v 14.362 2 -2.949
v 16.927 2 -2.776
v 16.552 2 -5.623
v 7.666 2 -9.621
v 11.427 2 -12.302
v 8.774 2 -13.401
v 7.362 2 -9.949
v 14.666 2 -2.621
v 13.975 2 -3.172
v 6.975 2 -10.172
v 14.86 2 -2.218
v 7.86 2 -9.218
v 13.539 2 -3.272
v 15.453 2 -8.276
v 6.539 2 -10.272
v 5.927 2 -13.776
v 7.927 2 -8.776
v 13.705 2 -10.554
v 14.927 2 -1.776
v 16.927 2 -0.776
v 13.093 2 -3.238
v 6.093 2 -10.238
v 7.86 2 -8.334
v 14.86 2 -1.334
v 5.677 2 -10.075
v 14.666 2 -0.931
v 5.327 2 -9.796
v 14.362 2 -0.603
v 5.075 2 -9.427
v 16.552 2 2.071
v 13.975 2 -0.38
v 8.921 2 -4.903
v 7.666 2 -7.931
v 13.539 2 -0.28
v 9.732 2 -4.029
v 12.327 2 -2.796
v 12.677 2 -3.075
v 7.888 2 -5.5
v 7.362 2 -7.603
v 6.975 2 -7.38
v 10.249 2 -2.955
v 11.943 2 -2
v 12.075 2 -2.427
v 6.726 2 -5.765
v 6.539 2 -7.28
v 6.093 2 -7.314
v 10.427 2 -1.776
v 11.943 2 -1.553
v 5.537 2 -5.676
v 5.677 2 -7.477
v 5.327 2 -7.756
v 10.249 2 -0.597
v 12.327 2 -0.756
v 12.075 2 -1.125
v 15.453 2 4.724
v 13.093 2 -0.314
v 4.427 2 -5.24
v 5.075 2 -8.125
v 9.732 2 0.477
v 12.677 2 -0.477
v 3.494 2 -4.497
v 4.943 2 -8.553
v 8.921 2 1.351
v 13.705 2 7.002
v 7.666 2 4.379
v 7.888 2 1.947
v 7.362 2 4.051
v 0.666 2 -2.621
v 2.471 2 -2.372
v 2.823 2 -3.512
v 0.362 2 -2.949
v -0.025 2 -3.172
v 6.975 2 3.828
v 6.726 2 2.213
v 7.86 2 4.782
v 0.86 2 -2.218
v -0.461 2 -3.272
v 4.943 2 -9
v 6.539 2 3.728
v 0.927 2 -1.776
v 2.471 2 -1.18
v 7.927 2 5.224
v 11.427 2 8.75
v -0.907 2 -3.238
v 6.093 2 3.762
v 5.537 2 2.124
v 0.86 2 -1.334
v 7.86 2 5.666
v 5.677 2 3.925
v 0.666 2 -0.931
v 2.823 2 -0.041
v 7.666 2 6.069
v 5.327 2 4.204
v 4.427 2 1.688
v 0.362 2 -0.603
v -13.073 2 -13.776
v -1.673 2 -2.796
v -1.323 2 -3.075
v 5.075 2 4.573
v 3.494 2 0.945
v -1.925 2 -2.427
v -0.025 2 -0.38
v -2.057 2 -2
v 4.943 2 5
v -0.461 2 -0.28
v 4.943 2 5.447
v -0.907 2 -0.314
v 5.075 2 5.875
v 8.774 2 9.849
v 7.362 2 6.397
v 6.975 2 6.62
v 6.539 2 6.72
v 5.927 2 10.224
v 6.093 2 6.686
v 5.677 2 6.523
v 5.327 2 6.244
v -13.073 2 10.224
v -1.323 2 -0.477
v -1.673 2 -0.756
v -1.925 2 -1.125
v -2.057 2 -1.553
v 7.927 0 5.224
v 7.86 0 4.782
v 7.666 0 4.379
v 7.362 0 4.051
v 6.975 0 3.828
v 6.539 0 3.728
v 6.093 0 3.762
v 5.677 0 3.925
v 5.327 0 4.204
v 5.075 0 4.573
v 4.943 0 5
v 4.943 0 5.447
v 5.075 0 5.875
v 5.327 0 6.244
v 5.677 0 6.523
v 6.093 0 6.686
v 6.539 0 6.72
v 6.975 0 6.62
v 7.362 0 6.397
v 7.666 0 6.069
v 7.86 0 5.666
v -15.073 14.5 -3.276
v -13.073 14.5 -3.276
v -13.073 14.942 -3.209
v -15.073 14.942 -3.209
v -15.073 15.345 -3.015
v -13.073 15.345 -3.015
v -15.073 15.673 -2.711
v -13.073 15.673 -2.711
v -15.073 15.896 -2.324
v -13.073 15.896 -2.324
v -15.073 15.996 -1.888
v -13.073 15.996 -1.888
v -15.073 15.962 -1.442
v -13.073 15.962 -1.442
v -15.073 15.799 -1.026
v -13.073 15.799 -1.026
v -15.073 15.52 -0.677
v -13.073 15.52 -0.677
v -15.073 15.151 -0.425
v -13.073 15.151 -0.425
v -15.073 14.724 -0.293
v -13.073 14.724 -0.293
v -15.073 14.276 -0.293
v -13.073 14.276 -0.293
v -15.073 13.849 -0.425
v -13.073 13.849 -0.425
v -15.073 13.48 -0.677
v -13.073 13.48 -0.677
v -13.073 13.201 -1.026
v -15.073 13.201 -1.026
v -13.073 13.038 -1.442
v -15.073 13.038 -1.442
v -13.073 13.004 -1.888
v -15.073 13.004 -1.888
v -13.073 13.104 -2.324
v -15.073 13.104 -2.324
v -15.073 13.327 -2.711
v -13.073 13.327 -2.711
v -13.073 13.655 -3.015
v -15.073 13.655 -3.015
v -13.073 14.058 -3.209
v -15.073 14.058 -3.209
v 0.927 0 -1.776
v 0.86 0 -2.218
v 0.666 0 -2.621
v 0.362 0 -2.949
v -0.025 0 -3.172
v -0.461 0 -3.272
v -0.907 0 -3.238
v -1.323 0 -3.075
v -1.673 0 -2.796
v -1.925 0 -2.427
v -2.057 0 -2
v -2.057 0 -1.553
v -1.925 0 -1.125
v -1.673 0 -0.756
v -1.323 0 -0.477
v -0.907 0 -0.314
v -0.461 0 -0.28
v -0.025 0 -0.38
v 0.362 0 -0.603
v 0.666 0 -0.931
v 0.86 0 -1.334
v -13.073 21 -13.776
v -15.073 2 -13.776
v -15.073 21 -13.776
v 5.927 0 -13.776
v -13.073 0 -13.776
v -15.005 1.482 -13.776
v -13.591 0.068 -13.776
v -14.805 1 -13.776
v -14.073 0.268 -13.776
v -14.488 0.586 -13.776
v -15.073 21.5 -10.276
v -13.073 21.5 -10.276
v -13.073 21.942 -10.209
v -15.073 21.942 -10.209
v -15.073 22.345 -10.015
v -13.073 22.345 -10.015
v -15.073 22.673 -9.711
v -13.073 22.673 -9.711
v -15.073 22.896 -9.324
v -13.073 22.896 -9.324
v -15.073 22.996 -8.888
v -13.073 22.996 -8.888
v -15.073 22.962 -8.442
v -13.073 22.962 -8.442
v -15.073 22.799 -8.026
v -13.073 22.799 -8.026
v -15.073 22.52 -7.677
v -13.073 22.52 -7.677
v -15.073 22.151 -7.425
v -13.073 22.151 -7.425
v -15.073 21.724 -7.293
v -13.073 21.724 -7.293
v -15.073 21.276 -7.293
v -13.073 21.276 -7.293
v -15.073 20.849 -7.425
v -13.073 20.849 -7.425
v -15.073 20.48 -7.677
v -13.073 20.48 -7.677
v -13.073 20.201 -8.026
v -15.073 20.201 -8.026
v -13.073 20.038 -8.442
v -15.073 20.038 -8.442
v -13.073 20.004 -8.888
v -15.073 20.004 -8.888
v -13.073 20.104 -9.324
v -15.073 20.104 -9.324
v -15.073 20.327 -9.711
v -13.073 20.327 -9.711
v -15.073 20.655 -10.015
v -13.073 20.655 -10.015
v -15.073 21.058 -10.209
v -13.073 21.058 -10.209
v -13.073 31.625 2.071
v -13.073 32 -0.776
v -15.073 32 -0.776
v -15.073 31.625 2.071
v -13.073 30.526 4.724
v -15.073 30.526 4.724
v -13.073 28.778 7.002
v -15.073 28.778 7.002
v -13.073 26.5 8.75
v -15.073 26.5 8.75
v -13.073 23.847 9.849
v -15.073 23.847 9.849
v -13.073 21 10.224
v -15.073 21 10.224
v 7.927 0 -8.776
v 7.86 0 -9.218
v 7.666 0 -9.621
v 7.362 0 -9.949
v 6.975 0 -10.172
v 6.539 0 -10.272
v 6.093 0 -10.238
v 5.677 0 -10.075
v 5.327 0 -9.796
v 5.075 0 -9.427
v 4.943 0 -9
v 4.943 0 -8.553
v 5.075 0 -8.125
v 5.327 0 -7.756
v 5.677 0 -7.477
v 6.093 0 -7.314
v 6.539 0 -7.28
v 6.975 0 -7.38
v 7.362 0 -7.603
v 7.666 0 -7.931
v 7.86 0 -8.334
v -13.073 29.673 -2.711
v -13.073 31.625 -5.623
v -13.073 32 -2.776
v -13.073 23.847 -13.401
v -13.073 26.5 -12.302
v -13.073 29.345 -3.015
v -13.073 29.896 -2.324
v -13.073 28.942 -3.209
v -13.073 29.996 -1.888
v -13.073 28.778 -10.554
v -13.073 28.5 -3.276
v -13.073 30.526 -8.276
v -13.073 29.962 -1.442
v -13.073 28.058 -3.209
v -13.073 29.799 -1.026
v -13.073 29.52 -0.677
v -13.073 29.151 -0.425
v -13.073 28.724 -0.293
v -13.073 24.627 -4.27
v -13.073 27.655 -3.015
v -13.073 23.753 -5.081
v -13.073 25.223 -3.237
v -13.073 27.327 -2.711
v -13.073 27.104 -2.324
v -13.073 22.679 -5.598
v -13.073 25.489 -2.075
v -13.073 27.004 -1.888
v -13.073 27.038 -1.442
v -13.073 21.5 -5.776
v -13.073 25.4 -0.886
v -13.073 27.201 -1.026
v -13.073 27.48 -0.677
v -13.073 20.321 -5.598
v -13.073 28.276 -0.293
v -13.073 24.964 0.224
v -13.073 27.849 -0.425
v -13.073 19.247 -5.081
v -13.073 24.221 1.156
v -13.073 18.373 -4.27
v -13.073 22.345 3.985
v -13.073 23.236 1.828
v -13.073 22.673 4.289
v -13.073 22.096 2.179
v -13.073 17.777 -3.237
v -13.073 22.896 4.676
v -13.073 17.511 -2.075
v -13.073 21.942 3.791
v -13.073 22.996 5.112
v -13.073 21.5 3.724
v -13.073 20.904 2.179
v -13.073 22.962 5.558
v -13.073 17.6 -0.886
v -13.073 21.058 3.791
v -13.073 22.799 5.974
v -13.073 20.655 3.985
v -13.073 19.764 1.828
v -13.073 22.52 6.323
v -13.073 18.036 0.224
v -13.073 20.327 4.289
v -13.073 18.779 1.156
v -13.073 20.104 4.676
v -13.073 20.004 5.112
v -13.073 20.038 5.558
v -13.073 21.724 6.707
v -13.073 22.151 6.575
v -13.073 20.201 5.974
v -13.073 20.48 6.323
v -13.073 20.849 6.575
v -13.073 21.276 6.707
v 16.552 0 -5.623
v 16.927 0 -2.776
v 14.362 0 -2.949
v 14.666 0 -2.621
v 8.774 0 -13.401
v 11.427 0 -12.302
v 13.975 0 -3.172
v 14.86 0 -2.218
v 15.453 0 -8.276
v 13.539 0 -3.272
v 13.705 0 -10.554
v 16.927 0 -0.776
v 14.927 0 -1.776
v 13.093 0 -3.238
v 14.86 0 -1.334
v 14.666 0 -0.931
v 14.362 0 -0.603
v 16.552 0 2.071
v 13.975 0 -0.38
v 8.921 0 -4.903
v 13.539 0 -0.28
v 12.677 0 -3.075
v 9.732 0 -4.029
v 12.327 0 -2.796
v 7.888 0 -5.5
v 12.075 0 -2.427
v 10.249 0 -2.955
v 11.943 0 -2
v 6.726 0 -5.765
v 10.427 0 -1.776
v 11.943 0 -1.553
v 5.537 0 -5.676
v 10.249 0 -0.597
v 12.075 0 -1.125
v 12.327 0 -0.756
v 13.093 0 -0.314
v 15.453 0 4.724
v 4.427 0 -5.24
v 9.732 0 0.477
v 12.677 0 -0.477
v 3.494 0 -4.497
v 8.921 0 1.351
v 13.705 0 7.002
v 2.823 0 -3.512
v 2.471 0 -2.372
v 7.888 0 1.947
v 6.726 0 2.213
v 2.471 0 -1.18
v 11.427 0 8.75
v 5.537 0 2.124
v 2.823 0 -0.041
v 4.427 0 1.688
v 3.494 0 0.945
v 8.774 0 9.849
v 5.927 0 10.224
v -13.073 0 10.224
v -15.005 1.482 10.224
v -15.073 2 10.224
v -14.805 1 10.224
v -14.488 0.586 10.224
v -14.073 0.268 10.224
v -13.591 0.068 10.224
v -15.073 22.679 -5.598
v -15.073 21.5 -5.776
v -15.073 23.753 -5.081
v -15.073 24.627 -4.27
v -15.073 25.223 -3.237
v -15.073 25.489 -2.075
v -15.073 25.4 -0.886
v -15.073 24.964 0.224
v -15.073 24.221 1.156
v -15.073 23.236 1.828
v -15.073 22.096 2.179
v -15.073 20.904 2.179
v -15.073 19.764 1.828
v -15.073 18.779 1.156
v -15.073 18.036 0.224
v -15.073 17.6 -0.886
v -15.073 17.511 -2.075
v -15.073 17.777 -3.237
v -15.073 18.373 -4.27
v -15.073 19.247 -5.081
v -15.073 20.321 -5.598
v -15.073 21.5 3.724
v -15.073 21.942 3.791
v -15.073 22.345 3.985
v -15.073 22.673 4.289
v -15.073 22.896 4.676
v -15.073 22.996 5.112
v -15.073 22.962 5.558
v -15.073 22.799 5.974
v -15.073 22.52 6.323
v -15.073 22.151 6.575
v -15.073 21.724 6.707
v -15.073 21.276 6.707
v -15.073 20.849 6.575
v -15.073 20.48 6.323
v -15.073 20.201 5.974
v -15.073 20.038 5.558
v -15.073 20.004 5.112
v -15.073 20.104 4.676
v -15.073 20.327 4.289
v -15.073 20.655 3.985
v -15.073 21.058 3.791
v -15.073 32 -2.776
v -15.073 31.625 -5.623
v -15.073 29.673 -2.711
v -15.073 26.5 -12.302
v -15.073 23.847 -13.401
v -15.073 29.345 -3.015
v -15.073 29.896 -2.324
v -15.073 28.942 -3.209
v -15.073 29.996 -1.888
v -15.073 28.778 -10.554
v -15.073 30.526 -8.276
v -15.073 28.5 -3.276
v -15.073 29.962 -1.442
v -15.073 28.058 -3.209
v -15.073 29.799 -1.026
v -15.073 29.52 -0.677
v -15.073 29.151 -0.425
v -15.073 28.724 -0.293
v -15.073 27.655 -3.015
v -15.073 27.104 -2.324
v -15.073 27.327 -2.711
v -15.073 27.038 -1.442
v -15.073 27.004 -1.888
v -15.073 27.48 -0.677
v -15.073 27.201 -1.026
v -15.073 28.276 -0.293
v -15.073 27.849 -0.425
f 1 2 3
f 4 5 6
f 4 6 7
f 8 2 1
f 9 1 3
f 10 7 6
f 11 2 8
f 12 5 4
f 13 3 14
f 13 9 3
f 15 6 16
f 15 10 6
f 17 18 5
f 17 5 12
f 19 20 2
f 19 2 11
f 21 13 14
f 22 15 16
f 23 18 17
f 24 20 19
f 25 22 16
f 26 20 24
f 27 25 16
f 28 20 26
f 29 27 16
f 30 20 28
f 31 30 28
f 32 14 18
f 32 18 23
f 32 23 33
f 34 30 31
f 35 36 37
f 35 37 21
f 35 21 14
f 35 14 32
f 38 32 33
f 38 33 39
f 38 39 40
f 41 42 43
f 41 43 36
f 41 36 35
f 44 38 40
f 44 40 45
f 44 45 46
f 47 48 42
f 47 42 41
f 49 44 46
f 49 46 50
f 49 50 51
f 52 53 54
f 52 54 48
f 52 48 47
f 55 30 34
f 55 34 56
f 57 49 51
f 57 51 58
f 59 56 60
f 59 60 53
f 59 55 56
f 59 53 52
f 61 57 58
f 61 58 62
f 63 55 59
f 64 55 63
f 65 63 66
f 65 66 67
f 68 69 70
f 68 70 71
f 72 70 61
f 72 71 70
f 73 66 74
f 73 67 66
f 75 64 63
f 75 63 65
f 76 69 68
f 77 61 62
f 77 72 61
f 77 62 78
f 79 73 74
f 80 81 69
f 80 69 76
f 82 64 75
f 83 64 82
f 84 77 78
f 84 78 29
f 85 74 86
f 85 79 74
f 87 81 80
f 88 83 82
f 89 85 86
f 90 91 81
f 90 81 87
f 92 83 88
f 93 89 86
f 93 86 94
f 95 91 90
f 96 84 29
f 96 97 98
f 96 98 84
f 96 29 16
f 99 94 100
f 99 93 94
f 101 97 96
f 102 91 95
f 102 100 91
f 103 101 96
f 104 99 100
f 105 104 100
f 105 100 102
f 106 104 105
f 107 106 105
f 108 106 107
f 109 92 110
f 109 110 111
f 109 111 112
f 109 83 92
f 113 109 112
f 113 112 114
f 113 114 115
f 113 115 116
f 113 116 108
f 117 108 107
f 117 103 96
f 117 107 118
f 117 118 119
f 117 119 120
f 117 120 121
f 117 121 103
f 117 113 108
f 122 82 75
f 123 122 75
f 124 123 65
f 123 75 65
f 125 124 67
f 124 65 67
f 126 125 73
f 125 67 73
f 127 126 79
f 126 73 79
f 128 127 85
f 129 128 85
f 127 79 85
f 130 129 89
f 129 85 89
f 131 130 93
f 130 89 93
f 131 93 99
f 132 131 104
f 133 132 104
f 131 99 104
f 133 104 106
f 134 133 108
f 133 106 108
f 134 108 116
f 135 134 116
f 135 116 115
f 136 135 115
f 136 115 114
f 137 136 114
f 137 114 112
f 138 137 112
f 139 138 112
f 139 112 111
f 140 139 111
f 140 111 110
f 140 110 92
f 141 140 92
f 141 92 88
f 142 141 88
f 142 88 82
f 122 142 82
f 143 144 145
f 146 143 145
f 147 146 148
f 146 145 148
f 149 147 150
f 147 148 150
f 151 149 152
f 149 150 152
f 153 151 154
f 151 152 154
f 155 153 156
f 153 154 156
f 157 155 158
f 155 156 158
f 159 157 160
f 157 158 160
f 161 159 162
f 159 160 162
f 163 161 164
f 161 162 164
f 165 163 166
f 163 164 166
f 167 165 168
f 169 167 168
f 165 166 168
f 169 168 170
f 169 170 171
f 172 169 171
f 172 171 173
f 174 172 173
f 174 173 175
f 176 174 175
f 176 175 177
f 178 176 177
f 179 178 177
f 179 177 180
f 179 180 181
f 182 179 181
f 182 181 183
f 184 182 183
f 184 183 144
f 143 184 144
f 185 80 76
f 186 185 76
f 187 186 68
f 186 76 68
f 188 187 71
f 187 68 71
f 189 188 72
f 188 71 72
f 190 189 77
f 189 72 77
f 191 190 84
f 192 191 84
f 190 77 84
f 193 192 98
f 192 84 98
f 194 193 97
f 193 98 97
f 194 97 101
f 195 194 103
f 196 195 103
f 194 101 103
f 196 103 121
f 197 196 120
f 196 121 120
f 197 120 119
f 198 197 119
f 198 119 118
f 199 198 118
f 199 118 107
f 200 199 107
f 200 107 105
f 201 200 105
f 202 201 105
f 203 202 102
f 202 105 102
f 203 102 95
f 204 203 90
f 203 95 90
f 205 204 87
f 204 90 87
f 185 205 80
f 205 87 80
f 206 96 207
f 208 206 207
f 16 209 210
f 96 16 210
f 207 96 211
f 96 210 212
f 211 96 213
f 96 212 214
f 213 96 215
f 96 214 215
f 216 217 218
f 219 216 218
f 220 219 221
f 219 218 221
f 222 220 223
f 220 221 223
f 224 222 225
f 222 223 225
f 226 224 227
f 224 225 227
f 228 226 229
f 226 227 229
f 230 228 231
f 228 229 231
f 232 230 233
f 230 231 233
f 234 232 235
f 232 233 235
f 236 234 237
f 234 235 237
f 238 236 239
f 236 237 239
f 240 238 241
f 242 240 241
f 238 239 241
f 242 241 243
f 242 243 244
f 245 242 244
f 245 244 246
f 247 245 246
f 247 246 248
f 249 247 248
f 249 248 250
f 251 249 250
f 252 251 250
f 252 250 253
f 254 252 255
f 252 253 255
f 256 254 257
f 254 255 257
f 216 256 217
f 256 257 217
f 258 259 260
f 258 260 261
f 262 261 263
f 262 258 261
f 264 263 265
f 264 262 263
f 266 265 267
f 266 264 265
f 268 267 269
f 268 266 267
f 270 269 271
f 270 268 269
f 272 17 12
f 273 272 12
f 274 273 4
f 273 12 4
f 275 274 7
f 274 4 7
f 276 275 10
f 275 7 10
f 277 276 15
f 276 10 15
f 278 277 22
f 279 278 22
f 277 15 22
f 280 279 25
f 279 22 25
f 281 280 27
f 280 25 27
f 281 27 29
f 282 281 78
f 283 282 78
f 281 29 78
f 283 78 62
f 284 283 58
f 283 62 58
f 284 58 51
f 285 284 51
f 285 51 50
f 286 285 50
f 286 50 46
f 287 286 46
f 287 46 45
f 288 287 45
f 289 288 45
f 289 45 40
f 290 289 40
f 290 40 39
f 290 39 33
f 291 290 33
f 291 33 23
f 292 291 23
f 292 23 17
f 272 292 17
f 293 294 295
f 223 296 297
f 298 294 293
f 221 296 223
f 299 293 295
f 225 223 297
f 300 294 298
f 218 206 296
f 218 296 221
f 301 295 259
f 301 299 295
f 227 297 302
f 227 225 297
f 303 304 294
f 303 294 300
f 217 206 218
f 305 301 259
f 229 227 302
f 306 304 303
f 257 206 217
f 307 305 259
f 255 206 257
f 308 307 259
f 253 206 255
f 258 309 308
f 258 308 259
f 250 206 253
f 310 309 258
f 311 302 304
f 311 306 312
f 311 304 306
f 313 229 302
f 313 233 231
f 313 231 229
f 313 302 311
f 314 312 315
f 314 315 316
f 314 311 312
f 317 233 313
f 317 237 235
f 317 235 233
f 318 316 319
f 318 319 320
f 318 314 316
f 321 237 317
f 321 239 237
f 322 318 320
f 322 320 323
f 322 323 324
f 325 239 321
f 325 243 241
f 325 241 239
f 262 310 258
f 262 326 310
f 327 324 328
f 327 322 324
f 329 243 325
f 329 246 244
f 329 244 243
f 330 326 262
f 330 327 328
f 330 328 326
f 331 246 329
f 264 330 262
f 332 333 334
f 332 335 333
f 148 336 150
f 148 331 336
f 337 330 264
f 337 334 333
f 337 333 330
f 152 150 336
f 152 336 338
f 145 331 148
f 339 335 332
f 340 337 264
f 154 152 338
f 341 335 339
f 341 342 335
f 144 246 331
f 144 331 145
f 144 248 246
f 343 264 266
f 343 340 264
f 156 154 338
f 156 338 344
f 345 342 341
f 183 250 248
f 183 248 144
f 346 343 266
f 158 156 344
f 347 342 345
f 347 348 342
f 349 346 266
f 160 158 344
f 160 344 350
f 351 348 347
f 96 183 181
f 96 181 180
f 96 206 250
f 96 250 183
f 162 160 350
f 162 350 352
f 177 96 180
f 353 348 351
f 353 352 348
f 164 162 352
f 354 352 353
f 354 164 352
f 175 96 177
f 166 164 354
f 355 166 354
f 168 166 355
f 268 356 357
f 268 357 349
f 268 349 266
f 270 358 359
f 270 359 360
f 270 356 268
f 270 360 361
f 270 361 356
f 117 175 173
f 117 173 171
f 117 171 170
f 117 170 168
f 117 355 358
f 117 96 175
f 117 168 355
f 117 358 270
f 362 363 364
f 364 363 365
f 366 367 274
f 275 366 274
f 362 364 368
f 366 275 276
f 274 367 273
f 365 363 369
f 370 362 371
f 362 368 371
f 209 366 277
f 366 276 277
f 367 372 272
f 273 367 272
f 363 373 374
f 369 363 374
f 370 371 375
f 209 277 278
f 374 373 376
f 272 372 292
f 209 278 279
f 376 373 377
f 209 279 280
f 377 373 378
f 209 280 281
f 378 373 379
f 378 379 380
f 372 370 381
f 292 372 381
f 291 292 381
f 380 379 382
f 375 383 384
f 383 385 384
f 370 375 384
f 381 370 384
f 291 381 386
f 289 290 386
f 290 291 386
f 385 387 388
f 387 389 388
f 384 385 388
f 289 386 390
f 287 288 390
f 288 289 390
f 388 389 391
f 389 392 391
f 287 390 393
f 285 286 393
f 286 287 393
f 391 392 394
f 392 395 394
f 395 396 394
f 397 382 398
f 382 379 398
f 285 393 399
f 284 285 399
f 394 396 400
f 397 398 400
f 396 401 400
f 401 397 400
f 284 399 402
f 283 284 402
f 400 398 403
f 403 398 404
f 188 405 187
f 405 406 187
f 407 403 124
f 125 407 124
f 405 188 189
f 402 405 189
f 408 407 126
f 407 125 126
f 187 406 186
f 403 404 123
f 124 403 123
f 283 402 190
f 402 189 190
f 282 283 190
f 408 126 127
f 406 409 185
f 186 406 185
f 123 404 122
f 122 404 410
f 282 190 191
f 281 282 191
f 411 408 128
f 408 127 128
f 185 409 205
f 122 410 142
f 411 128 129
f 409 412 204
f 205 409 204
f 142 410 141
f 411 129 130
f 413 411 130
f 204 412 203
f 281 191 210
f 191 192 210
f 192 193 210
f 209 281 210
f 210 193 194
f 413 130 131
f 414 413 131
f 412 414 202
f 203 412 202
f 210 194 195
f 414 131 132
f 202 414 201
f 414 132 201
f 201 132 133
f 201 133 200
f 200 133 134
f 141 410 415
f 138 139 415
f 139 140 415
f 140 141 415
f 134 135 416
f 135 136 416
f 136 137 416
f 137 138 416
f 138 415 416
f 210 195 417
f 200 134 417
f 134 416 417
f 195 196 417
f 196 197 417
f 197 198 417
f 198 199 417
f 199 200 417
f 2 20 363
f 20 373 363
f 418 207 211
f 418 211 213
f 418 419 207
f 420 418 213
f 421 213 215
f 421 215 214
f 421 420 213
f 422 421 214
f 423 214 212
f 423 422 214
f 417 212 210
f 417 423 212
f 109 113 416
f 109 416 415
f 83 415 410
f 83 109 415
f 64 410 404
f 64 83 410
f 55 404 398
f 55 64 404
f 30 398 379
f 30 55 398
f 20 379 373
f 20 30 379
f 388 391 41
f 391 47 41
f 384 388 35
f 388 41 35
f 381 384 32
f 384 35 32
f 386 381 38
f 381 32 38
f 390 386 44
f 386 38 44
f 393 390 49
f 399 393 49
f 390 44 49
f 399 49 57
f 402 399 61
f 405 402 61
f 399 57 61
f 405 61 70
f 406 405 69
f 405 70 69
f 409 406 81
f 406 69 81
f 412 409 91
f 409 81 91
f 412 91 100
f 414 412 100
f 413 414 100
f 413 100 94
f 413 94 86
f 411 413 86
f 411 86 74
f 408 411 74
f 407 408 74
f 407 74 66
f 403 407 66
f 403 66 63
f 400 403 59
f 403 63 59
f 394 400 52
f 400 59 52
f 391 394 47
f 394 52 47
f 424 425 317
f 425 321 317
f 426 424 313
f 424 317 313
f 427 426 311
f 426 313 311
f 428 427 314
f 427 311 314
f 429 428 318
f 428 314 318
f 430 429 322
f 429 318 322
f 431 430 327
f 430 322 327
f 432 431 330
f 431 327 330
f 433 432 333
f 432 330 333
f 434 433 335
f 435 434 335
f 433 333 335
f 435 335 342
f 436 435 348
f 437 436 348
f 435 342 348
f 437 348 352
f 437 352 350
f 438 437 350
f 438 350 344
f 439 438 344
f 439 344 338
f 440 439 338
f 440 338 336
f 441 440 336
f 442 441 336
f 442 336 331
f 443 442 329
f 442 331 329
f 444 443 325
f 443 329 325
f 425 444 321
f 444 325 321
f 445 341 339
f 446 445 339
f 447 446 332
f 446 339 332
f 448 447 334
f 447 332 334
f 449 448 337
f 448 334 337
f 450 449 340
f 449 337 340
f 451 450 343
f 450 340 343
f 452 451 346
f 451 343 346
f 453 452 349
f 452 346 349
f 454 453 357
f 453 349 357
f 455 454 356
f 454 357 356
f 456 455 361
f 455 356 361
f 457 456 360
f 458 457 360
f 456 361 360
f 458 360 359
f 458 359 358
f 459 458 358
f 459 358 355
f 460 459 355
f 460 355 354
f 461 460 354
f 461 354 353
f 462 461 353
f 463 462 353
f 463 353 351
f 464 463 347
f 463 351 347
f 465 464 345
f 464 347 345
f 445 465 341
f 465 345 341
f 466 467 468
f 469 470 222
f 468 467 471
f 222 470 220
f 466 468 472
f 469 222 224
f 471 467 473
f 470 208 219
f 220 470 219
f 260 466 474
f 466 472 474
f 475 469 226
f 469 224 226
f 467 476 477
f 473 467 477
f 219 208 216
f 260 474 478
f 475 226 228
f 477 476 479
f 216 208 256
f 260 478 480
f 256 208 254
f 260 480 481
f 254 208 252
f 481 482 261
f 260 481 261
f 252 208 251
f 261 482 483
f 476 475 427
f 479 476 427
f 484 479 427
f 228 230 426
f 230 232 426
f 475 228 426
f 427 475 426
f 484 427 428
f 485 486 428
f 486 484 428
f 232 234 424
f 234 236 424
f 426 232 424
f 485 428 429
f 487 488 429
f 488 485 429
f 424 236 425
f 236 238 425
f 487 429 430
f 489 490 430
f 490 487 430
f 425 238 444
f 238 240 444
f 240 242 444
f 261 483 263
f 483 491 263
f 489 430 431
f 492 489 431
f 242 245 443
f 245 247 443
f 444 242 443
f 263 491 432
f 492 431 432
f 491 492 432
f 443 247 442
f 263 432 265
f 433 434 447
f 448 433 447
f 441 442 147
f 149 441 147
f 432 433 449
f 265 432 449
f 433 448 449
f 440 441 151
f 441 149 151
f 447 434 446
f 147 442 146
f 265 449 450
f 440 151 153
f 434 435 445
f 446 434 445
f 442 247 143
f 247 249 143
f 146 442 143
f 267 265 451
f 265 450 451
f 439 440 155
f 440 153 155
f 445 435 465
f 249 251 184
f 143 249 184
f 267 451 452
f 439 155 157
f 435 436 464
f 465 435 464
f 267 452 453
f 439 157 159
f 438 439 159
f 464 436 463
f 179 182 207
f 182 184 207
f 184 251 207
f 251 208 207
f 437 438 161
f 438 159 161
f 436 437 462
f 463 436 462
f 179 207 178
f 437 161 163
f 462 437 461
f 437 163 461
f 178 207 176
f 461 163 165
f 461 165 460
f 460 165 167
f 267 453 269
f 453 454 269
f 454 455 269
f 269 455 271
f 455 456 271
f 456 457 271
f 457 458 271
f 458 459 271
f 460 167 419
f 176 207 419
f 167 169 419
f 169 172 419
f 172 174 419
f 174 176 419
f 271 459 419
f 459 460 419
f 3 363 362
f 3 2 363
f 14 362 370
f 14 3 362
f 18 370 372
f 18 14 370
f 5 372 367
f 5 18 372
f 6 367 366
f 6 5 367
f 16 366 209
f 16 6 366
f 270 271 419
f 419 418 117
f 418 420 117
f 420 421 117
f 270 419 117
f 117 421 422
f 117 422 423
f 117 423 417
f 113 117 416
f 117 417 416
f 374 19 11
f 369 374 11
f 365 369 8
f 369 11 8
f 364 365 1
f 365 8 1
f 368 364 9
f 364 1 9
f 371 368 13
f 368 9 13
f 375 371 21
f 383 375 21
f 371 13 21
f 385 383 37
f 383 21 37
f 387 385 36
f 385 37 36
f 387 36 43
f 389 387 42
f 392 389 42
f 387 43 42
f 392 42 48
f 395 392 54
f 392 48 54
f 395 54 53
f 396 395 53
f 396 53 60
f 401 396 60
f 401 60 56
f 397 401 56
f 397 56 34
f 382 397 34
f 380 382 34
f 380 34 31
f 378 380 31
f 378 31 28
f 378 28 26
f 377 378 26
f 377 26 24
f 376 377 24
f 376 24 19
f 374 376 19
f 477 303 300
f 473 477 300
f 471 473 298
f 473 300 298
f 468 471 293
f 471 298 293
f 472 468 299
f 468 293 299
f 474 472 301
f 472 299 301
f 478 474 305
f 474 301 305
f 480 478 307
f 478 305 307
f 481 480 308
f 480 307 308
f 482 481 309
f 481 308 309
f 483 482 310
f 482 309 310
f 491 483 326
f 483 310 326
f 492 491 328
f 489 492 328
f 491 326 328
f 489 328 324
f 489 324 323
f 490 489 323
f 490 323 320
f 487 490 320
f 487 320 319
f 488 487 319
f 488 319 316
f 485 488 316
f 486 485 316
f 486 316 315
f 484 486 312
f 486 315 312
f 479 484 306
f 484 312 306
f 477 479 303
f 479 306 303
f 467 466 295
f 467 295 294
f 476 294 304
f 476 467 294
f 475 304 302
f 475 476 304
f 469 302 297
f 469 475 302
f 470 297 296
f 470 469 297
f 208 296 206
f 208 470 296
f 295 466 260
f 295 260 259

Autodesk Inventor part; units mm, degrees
ref_plane "YZ Plane" through (0, 0, 0) normal (1, 0, 0) x (0, 1, 0)
ref_plane "XZ Plane" through (0, 0, 0) normal (0, 1, 0) x (-1, 0, 0)
ref_plane "XY Plane" through (0, 0, 0) normal (0, 0, 1) x (1, 0, 0)
sketch "Эскиз1" plane through (0, 0, 0) normal (0, 1, 0) x (-1, 0, 0)
  line L0 (15.0734, 10.2239) -> (-16.9266, 10.2239)
  line L1 (-16.9266, 10.2239) -> (-16.9266, -13.7761)
  line L2 (-16.9266, -13.7761) -> (15.0734, -13.7761)
  line L3 (15.0734, -13.7761) -> (15.0734, 10.2239)
  point P0 (0, 0)
  dimension "d0" = 32
  dimension "d1" = 24
extrude "Выдавливание1" add sketch "Эскиз1" along normal blind 2
sketch "Эскиз2" plane through (0, 2, 0) normal (0, 1, 0) x (1, 0, 0)
  line L0 (16.9266, 13.7761) -> (-15.0734, 13.7761) projected
  line L1 (-15.0734, -10.2239) -> (16.9266, -10.2239) projected
  line L2 (-15.0734, 13.7761) -> (-13.0734, 13.7761)
  line L3 (-13.0734, 13.7761) -> (-13.0734, -10.2239)
  line L4 (-13.0734, -10.2239) -> (-15.0734, -10.2239)
  line L5 (-15.0734, -10.2239) -> (-15.0734, 13.7761)
  point P0 (0, 0)
  dimension "d4" = 2
extrude "Выдавливание2" add sketch "Эскиз2" along normal blind 30
sketch "Эскиз3" plane through (-13.0734, 2, 10.2239) normal (1, 0, 0) x (0, 0, -1)
  circle A0 centre (12, 19.5) radius 4
  circle A1 centre (12, 19.5) radius 7
  line L0 (24, 30) -> (0, 30) projected
  line L1 (24, 0) -> (24, 30) projected
  circle A2 centre (19, 19.5) radius 1.5
  circle A3 centre (12, 12.5) radius 1.5
  circle A4 centre (5, 19.5) radius 1.5
  circle A5 centre (12, 26.5) radius 1.5
  point P0 (10.2239, -2)
  point P1 (12, 30)
  dimension "d7" = 8
  dimension "d8" = 14
  dimension "d10" = 12
  dimension "d11" = 3
  dimension "d12" = 3
  dimension "d13" = 3
  dimension "d14" = 3
  dimension "d15" = 3.5
  dimension "d16" = 0
  dimension "d17" = 0
  dimension "d18" = 0
  dimension "d19" = 7
extrude "Выдавливание3" cut sketch "Эскиз3" against normal blind 100 contours A0 | A1 A2 | A1 A2 | A5 A1 | A1 A5 | A3 A1 | A1 A3 | A4 A1 | A1 A4
sketch "Эскиз4" plane through (0, 2, 0) normal (0, 1, 0) x (1, 0, 0)
  circle A0 centre (6.4266, 1.7761) radius 4
  circle A1 centre (6.4266, 1.7761) radius 7
  circle A2 centre (6.4266, -5.2239) radius 1.5
  circle A3 centre (6.4266, 8.7761) radius 1.5
  circle A4 centre (-0.5734, 1.7761) radius 1.5
  circle A5 centre (13.4266, 1.7761) radius 1.5
  line L0 (16.9266, -10.2239) -> (16.9266, 13.7761) projected
  line L1 (16.9266, 13.7761) -> (-13.0734, 13.7761) projected
  point P0 (0, 0)
  point P1 (16.9266, 1.7761)
  dimension "d22" = 8
  dimension "d23" = 14
  dimension "d24" = 3
  dimension "d25" = 3
  dimension "d26" = 3
  dimension "d27" = 3
  dimension "d29" = 12
  dimension "d30" = 3.5
extrude "Выдавливание4" cut sketch "Эскиз4" against normal blind 100 contours A0 | A1 A5 | A1 A5 | A3 A1 | A1 A3 | A2 A1 | A1 A2 | A4 A1 | A1 A4
fillet "Сопряжение1" radius 11 4 edges at (-14.0734, 32, 10.2239) (-14.0734, 32, -13.7761) (16.9266, 1, -13.7761) (16.9266, 1, 10.2239)
fillet "Сопряжение2" radius 2 1 edges at (-15.0734, 0, -1.7761)
properties part number "уголок" material "Сталь"
